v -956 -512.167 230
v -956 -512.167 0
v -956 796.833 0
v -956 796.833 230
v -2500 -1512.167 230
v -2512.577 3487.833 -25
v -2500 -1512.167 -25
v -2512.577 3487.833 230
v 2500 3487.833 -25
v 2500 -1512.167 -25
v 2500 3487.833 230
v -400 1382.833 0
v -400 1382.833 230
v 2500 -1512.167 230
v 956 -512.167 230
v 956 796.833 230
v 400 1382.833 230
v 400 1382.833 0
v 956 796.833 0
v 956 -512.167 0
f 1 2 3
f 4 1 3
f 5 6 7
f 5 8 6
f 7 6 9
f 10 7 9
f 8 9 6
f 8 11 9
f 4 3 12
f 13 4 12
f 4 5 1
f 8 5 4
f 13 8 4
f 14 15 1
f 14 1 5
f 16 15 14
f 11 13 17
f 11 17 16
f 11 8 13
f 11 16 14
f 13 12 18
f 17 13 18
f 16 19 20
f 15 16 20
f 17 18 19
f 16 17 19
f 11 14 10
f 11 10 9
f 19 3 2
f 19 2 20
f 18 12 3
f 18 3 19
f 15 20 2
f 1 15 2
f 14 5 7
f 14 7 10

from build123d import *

# Parameters (mm, degrees)
F1_DEPTH = 230
F2_DEPTH = 25


# Not quite as in the source:
# - a feature names something its author has since deleted; it is built from what else it names


with BuildPart() as f1:
    # F0 (on Top) → F1 (new body)
    with BuildSketch(Plane.XY):
        Polygon((-2512.5771939687, 3487.8331422806), (-2500, -1512.1668577194), (2500, -1512.1668577194), (2500, 3487.8331422806), align=None)
        Polygon((-956, 796.8331971962), (-400, 1382.8331971962), (0, 1382.8331971962), (400, 1382.8331971962), (956, 796.8331971962), (956, -512.1668028038), (-956, -512.1668028038), align=None, mode=Mode.SUBTRACT)
    extrude(amount=F1_DEPTH)

    # F0 (on Top) → F2 (join)
    with BuildSketch(Plane.XY):
        Polygon((-2512.5771939687, 3487.8331422806), (-2500, -1512.1668577194), (2500, -1512.1668577194), (2500, 3487.8331422806), align=None)
        Polygon((-956, 796.8331971962), (-400, 1382.8331971962), (0, 1382.8331971962), (400, 1382.8331971962), (956, 796.8331971962), (956, -512.1668028038), (-956, -512.1668028038), align=None, mode=Mode.SUBTRACT)
        Polygon((0, 1382.8331971962), (-400, 1382.8331971962), (-956, 796.8331971962), (-956, -512.1668028038), (956, -512.1668028038), (956, 796.8331971962), (400, 1382.8331971962), align=None)
    extrude(amount=-F2_DEPTH)


solid = f1.part
